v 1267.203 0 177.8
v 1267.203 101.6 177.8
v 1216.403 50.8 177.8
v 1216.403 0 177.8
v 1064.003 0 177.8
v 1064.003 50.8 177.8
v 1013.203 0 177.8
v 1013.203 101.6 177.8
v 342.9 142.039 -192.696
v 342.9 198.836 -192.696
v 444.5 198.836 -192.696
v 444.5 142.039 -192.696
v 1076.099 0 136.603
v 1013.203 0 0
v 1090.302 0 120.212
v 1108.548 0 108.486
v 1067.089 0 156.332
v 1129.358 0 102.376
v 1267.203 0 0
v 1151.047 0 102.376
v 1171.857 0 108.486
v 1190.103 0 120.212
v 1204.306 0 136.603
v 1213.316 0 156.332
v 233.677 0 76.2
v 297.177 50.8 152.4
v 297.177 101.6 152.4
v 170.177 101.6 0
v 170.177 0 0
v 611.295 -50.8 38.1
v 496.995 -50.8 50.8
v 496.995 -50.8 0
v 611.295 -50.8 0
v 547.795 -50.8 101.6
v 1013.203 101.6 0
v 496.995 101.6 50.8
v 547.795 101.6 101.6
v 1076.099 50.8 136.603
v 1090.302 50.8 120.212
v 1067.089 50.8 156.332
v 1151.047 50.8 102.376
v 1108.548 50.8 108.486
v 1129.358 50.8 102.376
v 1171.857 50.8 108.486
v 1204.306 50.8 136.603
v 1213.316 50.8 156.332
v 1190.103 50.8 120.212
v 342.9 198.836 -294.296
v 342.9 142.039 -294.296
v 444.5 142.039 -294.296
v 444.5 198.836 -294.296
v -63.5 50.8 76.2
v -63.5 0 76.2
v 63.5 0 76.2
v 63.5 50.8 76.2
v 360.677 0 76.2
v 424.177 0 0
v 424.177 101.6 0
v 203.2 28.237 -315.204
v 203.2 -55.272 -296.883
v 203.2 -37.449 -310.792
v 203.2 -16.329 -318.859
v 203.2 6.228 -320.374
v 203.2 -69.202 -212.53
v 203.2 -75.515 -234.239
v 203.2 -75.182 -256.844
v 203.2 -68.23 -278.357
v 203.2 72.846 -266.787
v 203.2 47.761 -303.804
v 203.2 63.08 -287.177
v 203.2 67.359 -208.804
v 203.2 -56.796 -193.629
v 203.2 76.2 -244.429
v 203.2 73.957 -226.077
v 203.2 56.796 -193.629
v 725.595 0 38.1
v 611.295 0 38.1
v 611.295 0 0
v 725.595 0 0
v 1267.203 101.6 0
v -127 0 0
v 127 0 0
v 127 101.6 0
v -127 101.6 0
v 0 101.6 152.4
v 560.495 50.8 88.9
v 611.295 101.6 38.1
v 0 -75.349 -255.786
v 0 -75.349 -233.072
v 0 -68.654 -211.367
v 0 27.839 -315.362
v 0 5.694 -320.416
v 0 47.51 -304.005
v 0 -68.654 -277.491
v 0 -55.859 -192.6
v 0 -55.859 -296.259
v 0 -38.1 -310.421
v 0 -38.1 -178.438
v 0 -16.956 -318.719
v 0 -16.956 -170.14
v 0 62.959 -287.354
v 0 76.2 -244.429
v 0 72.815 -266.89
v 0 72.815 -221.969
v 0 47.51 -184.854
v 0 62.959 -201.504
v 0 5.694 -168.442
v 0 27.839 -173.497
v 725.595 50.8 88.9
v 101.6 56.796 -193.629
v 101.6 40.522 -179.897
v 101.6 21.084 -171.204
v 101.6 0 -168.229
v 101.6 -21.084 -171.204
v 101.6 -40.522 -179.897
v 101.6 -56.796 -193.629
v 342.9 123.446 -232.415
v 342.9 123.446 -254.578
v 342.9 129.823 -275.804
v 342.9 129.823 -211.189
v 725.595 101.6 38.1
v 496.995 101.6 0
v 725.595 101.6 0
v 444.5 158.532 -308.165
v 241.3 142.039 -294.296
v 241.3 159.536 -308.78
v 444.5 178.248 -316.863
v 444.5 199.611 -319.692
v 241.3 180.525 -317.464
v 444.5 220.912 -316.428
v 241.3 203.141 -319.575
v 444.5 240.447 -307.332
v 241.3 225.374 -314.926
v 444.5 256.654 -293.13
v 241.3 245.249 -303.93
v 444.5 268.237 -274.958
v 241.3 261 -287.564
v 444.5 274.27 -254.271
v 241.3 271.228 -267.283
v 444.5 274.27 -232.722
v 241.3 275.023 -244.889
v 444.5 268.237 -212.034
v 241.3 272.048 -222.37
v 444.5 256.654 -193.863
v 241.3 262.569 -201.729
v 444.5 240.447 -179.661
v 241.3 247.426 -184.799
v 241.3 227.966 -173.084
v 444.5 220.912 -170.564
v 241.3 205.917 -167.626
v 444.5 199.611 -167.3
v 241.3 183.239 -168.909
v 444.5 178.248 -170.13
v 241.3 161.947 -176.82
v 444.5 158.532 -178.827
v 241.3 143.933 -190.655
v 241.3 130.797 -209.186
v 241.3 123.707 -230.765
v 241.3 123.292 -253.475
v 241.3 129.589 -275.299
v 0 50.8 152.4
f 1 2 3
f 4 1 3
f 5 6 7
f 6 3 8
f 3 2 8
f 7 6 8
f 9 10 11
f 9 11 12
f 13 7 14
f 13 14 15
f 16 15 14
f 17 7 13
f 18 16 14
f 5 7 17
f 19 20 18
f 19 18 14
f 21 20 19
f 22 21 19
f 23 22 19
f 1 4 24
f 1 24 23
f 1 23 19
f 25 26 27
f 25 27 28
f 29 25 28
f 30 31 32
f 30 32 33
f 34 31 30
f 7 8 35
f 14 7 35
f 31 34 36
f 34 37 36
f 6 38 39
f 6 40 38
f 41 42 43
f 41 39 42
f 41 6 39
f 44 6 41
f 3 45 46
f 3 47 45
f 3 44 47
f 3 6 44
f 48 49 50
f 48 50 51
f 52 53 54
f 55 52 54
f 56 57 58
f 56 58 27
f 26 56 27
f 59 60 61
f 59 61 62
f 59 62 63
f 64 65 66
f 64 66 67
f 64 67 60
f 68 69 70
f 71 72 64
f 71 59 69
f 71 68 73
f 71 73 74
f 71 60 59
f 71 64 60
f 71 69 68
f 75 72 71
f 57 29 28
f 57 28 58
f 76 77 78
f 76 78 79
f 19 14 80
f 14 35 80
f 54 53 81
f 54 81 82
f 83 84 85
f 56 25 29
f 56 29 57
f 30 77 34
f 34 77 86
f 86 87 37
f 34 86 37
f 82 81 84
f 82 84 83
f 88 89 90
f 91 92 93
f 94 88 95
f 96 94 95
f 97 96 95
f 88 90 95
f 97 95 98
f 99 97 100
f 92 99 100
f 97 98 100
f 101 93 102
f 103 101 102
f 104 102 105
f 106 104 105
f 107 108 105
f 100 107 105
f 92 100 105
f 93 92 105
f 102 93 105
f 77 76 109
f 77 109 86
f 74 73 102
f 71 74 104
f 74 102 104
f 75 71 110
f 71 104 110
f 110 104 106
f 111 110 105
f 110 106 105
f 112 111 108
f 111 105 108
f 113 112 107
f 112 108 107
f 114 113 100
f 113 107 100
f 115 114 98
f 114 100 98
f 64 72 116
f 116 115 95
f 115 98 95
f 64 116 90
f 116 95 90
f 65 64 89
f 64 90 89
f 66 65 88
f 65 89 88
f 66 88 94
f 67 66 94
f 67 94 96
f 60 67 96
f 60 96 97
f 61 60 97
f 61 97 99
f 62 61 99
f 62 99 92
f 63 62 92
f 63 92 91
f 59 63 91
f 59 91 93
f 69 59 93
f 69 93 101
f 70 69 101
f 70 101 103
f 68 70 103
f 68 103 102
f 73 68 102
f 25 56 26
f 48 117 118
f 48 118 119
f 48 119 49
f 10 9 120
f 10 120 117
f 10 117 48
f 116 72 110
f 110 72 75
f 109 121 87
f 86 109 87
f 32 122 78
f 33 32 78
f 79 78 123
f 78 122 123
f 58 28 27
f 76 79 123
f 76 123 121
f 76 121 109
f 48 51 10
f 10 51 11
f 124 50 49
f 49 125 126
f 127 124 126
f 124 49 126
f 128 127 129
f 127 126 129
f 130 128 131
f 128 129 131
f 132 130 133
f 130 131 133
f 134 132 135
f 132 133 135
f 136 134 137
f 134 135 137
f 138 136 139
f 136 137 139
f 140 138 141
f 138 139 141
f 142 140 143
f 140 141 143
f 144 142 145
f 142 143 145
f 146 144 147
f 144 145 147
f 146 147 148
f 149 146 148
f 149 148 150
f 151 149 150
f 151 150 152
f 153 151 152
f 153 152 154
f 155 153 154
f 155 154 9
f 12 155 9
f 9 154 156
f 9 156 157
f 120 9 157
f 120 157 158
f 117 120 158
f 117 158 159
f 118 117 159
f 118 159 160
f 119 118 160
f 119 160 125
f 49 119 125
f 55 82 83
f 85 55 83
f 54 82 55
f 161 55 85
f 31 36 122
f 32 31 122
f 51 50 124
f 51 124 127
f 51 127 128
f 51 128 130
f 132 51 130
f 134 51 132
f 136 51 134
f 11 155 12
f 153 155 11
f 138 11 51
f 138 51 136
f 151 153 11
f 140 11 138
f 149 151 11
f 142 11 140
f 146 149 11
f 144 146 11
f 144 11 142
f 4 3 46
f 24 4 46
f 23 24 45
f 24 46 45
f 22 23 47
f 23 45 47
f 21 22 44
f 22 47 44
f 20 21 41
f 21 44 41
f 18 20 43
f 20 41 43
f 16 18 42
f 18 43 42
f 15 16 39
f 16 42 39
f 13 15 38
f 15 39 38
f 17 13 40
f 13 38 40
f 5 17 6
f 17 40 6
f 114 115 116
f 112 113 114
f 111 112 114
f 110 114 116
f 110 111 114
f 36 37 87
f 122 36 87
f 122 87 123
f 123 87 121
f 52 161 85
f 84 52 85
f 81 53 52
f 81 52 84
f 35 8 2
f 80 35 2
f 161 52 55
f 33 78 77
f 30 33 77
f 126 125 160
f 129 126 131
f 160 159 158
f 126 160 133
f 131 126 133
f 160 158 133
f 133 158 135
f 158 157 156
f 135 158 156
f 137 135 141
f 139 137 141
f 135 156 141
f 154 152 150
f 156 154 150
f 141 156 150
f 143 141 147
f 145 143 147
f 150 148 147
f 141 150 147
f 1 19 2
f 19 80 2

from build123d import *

# Parameters (mm, degrees)
F1_DEPTH   = 101.6
F3_DEPTH   = 50.8
F5_DEPTH   = 101.6
F6_W       = 127
F6_H       = 50.8
F7_DEPTH   = 101.6
F8_SIZE    = 50.79999
F10_DEPTH  = 101.6
F11_DEPTH  = 101.6
F11_FACE_W = 254
F11_FACE_H = 177.8
F12_DEPTH  = 50.8
F14_DEPTH  = 50.8
F16_DEPTH  = 50.8
F17_R      = 76.2
F18_DEPTH  = 203.2
F20_DEPTH  = 101.6
F23_DEPTH  = 203.2
F25_DEPTH  = 101.6
F29_DEPTH  = 76.2


# Not quite as in the source:
# - a fillet or chamfer is up to 0.001 mm smaller than in the source, because OpenCascade refuses the exact size
# - ends of sketch curves that miss each other by under 0.0002 mm in the source are joined


with BuildPart() as f1:
    # F0 (on Front) → F1 (new body)
    with BuildSketch(Plane.XZ):
        Polygon((0, 152.4), (-63.5, 76.2), (0, 76.2), (63.5, 76.2), align=None)
        Polygon((-127, 0), (0, 0), (127, 0), (63.5, 76.2), (0, 76.2), (-63.5, 76.2), align=None)
    extrude(amount=-F1_DEPTH)

    # F2 (on face) → F3 (cut)
    with BuildSketch(Plane.XZ):
        Polygon((-63.5, 76.2), (0, 76.2), (63.5, 76.2), (0, 152.4), align=None)
    extrude(amount=-F3_DEPTH, mode=Mode.SUBTRACT)


with BuildPart() as f5:
    # F4 (on Front) → F5 (new body)
    with BuildSketch(Plane.XZ):
        Polygon((233.6774150133, 76.2), (170.1774150133, 0), (424.1774150133, 0), (360.6774150133, 76.2), (297.1774150133, 76.2), align=None)
        Polygon((297.1774150133, 152.4), (233.6774150133, 76.2), (297.1774150133, 76.2), (360.6774150133, 76.2), align=None)
    extrude(amount=-F5_DEPTH)

    # F28 (on 3pt) → F29 (cut, symmetric)
    with BuildSketch(Plane.YZ.offset(297.1774150133)):
        Polygon((50.8, 152.4), (0, 152.4), (0, 76.2), align=None)
    extrude(amount=F29_DEPTH, both=True, mode=Mode.SUBTRACT)


with BuildPart() as f7:
    # F6 (on Front) → F7 (new body)
    with BuildSketch(Plane.XZ):
        Polygon((496.9945251942, 50.8), (496.9945251942, 0), (598.5945251942, 0), (598.5945251942, 50.8), (560.4945251942, 88.9), (547.7945251942, 101.6), align=None)
        Polygon((560.4945251942, 88.9), (598.5945251942, 50.8), (725.5945251942, 50.8), (725.5945251942, 88.9), align=None)
        with Locations((662.0945251942, 25.4)):
            Rectangle(F6_W, F6_H)
    extrude(amount=-F7_DEPTH)

    # F8 (size 50.8 in the source; OpenCascade refuses exactly that, so slightly less here)
    f8_edges = [f7.edges().sort_by_distance(p)[0] for p in [
        (643.044525, 0, 88.9),
        (643.044525, 101.6, 88.9),
    ]]
    chamfer(f8_edges, length=F8_SIZE)

    # F15 (on face) → F16 (join)
    with BuildSketch(Plane.XZ):
        Polygon((611.2945251942, 0), (611.2945251942, 38.1), (560.4945251942, 88.9), (547.7945251942, 101.6), (496.9945251942, 50.8), (496.9945251942, 0), align=None)
    extrude(amount=F16_DEPTH)


with BuildPart() as f10:
    # F9 (on Front) → F10 (new body)
    with BuildSketch(Plane.XZ):
        with BuildLine():
            Line((1013.2026672363, 177.8), (1013.2026672363, 0))
            Line((1013.2026672363, 0), (1267.2026672363, 0))
            Line((1267.2026672363, 0), (1267.2026672363, 177.8))
            Line((1267.2026672363, 177.8), (1216.4026672363, 177.8))
            ThreePointArc((1216.4026672363, 177.8), (1140.2026672363, 101.6), (1064.0026672363, 177.8))
            Line((1064.0026672363, 177.8), (1013.2026672363, 177.8))
        make_face()
    extrude(amount=-F10_DEPTH)

    # F9 (on Front) → F11 (join)
    with BuildSketch(Plane.XZ):
        with BuildLine():
            Line((1013.2026672363, 177.8), (1013.2026672363, 0))
            Line((1013.2026672363, 0), (1267.2026672363, 0))
            Line((1267.2026672363, 0), (1267.2026672363, 177.8))
            Line((1267.2026672363, 177.8), (1216.4026672363, 177.8))
            ThreePointArc((1216.4026672363, 177.8), (1140.2026672363, 101.6), (1064.0026672363, 177.8))
            Line((1064.0026672363, 177.8), (1013.2026672363, 177.8))
        make_face()
        with BuildLine():
            Line((1216.4026672363, 177.8), (1064.0026672363, 177.8))
            ThreePointArc((1064.0026672363, 177.8), (1140.2026672363, 101.6), (1216.4026672363, 177.8))
        make_face()
    extrude(amount=-F11_DEPTH)

    # F9 (on Front) + F11_face (on face) → F12 (cut)
    with BuildSketch(Plane.XZ):
        with BuildLine():
            Line((1013.2026672363, 177.8), (1013.2026672363, 0))
            Line((1013.2026672363, 0), (1267.2026672363, 0))
            Line((1267.2026672363, 0), (1267.2026672363, 177.8))
            Line((1267.2026672363, 177.8), (1216.4026672363, 177.8))
            ThreePointArc((1216.4026672363, 177.8), (1140.2026672363, 101.6), (1064.0026672363, 177.8))
            Line((1064.0026672363, 177.8), (1013.2026672363, 177.8))
        make_face()
        with BuildLine():
            Line((1216.4026672363, 177.8), (1064.0026672363, 177.8))
            ThreePointArc((1064.0026672363, 177.8), (1140.2026672363, 101.6), (1216.4026672363, 177.8))
        make_face()
    with BuildSketch(Plane(origin=(1140.2026672363, 0, 88.9), x_dir=(1, 0, 0), z_dir=(0, -1, 0))):
        Rectangle(F11_FACE_W, F11_FACE_H)
    extrude(amount=-F12_DEPTH, mode=Mode.SUBTRACT)

    # F13 (on face) → F14 (join)
    with BuildSketch(Plane.XZ.offset(-50.8)):
        with BuildLine():
            Line((1013.2026672363, 177.8), (1013.2026672363, 0))
            Line((1013.2026672363, 0), (1267.2026672363, 0))
            Line((1267.2026672363, 0), (1267.2026672363, 177.8))
            Line((1267.2026672363, 177.8), (1216.4026672363, 177.8))
            ThreePointArc((1216.4026672363, 177.8), (1140.2026672363, 101.6), (1064.0026672363, 177.8))
            Line((1064.0026672363, 177.8), (1013.2026672363, 177.8))
        make_face()
    extrude(amount=F14_DEPTH)


with BuildPart() as f18:
    # F17 (on Right) → F18 (new body)
    with BuildSketch(Plane.YZ):
        with Locations((0, -244.4293797016)):
            Circle(F17_R)
    extrude(amount=F18_DEPTH)

    # F19 (on face) → F20 (cut)
    with BuildSketch(Plane.YZ.offset(203.2)):
        with BuildLine():
            Line((-56.7961266285, -193.6293797016), (0, -193.6293797016))
            Line((0, -193.6293797016), (56.7961266285, -193.6293797016))
            ThreePointArc((56.7961266285, -193.6293797016), (0, -168.2293797016), (-56.7961266285, -193.6293797016))
        make_face()
    extrude(amount=-F20_DEPTH, mode=Mode.SUBTRACT)


with BuildPart() as f23:
    # F22 (on offset) → F23 (new body)
    with BuildSketch(Plane.YZ.offset(241.3)):
        with BuildLine():
            Line((198.8355070353, -192.6963732958), (142.0393804068, -192.6963732958))
            ThreePointArc((142.0393804068, -192.6963732958), (122.6355070353, -243.4963732958), (142.0393804068, -294.2963732958))
            Line((142.0393804068, -294.2963732958), (198.8355070353, -294.2963732958))
            Line((198.8355070353, -294.2963732958), (198.8355070353, -243.4963732958))
            Line((198.8355070353, -243.4963732958), (198.8355070353, -192.6963732958))
        make_face()
        with BuildLine():
            ThreePointArc((142.0393804068, -294.2963732958), (226.025350276, -314.6803070487), (275.0355070353, -243.4963732958))
            ThreePointArc((275.0355070353, -243.4963732958), (226.025350276, -172.3124395428), (142.0393804068, -192.6963732958))
            Line((142.0393804068, -192.6963732958), (198.8355070353, -192.6963732958))
            Line((198.8355070353, -192.6963732958), (198.8355070353, -243.4963732958))
            Line((198.8355070353, -243.4963732958), (198.8355070353, -294.2963732958))
            Line((198.8355070353, -294.2963732958), (142.0393804068, -294.2963732958))
        make_face()
    extrude(amount=F23_DEPTH)

    # F24 (on face) → F25 (cut)
    with BuildSketch(Plane.YZ.offset(444.5)):
        with BuildLine():
            Line((198.8355070353, -294.2963732958), (198.8355070353, -243.4963732958))
            Line((198.8355070353, -243.4963732958), (198.8355070353, -192.6963732958))
            Line((198.8355070353, -192.6963732958), (142.0393804068, -192.6963732958))
            ThreePointArc((142.0393804068, -192.6963732958), (122.6355070353, -243.4963732958), (142.0393804068, -294.2963732958))
            Line((142.0393804068, -294.2963732958), (198.8355070353, -294.2963732958))
        make_face()
    extrude(amount=-F25_DEPTH, mode=Mode.SUBTRACT)


solid = Compound([f1.part, f5.part, f7.part, f10.part, f18.part, f23.part])
